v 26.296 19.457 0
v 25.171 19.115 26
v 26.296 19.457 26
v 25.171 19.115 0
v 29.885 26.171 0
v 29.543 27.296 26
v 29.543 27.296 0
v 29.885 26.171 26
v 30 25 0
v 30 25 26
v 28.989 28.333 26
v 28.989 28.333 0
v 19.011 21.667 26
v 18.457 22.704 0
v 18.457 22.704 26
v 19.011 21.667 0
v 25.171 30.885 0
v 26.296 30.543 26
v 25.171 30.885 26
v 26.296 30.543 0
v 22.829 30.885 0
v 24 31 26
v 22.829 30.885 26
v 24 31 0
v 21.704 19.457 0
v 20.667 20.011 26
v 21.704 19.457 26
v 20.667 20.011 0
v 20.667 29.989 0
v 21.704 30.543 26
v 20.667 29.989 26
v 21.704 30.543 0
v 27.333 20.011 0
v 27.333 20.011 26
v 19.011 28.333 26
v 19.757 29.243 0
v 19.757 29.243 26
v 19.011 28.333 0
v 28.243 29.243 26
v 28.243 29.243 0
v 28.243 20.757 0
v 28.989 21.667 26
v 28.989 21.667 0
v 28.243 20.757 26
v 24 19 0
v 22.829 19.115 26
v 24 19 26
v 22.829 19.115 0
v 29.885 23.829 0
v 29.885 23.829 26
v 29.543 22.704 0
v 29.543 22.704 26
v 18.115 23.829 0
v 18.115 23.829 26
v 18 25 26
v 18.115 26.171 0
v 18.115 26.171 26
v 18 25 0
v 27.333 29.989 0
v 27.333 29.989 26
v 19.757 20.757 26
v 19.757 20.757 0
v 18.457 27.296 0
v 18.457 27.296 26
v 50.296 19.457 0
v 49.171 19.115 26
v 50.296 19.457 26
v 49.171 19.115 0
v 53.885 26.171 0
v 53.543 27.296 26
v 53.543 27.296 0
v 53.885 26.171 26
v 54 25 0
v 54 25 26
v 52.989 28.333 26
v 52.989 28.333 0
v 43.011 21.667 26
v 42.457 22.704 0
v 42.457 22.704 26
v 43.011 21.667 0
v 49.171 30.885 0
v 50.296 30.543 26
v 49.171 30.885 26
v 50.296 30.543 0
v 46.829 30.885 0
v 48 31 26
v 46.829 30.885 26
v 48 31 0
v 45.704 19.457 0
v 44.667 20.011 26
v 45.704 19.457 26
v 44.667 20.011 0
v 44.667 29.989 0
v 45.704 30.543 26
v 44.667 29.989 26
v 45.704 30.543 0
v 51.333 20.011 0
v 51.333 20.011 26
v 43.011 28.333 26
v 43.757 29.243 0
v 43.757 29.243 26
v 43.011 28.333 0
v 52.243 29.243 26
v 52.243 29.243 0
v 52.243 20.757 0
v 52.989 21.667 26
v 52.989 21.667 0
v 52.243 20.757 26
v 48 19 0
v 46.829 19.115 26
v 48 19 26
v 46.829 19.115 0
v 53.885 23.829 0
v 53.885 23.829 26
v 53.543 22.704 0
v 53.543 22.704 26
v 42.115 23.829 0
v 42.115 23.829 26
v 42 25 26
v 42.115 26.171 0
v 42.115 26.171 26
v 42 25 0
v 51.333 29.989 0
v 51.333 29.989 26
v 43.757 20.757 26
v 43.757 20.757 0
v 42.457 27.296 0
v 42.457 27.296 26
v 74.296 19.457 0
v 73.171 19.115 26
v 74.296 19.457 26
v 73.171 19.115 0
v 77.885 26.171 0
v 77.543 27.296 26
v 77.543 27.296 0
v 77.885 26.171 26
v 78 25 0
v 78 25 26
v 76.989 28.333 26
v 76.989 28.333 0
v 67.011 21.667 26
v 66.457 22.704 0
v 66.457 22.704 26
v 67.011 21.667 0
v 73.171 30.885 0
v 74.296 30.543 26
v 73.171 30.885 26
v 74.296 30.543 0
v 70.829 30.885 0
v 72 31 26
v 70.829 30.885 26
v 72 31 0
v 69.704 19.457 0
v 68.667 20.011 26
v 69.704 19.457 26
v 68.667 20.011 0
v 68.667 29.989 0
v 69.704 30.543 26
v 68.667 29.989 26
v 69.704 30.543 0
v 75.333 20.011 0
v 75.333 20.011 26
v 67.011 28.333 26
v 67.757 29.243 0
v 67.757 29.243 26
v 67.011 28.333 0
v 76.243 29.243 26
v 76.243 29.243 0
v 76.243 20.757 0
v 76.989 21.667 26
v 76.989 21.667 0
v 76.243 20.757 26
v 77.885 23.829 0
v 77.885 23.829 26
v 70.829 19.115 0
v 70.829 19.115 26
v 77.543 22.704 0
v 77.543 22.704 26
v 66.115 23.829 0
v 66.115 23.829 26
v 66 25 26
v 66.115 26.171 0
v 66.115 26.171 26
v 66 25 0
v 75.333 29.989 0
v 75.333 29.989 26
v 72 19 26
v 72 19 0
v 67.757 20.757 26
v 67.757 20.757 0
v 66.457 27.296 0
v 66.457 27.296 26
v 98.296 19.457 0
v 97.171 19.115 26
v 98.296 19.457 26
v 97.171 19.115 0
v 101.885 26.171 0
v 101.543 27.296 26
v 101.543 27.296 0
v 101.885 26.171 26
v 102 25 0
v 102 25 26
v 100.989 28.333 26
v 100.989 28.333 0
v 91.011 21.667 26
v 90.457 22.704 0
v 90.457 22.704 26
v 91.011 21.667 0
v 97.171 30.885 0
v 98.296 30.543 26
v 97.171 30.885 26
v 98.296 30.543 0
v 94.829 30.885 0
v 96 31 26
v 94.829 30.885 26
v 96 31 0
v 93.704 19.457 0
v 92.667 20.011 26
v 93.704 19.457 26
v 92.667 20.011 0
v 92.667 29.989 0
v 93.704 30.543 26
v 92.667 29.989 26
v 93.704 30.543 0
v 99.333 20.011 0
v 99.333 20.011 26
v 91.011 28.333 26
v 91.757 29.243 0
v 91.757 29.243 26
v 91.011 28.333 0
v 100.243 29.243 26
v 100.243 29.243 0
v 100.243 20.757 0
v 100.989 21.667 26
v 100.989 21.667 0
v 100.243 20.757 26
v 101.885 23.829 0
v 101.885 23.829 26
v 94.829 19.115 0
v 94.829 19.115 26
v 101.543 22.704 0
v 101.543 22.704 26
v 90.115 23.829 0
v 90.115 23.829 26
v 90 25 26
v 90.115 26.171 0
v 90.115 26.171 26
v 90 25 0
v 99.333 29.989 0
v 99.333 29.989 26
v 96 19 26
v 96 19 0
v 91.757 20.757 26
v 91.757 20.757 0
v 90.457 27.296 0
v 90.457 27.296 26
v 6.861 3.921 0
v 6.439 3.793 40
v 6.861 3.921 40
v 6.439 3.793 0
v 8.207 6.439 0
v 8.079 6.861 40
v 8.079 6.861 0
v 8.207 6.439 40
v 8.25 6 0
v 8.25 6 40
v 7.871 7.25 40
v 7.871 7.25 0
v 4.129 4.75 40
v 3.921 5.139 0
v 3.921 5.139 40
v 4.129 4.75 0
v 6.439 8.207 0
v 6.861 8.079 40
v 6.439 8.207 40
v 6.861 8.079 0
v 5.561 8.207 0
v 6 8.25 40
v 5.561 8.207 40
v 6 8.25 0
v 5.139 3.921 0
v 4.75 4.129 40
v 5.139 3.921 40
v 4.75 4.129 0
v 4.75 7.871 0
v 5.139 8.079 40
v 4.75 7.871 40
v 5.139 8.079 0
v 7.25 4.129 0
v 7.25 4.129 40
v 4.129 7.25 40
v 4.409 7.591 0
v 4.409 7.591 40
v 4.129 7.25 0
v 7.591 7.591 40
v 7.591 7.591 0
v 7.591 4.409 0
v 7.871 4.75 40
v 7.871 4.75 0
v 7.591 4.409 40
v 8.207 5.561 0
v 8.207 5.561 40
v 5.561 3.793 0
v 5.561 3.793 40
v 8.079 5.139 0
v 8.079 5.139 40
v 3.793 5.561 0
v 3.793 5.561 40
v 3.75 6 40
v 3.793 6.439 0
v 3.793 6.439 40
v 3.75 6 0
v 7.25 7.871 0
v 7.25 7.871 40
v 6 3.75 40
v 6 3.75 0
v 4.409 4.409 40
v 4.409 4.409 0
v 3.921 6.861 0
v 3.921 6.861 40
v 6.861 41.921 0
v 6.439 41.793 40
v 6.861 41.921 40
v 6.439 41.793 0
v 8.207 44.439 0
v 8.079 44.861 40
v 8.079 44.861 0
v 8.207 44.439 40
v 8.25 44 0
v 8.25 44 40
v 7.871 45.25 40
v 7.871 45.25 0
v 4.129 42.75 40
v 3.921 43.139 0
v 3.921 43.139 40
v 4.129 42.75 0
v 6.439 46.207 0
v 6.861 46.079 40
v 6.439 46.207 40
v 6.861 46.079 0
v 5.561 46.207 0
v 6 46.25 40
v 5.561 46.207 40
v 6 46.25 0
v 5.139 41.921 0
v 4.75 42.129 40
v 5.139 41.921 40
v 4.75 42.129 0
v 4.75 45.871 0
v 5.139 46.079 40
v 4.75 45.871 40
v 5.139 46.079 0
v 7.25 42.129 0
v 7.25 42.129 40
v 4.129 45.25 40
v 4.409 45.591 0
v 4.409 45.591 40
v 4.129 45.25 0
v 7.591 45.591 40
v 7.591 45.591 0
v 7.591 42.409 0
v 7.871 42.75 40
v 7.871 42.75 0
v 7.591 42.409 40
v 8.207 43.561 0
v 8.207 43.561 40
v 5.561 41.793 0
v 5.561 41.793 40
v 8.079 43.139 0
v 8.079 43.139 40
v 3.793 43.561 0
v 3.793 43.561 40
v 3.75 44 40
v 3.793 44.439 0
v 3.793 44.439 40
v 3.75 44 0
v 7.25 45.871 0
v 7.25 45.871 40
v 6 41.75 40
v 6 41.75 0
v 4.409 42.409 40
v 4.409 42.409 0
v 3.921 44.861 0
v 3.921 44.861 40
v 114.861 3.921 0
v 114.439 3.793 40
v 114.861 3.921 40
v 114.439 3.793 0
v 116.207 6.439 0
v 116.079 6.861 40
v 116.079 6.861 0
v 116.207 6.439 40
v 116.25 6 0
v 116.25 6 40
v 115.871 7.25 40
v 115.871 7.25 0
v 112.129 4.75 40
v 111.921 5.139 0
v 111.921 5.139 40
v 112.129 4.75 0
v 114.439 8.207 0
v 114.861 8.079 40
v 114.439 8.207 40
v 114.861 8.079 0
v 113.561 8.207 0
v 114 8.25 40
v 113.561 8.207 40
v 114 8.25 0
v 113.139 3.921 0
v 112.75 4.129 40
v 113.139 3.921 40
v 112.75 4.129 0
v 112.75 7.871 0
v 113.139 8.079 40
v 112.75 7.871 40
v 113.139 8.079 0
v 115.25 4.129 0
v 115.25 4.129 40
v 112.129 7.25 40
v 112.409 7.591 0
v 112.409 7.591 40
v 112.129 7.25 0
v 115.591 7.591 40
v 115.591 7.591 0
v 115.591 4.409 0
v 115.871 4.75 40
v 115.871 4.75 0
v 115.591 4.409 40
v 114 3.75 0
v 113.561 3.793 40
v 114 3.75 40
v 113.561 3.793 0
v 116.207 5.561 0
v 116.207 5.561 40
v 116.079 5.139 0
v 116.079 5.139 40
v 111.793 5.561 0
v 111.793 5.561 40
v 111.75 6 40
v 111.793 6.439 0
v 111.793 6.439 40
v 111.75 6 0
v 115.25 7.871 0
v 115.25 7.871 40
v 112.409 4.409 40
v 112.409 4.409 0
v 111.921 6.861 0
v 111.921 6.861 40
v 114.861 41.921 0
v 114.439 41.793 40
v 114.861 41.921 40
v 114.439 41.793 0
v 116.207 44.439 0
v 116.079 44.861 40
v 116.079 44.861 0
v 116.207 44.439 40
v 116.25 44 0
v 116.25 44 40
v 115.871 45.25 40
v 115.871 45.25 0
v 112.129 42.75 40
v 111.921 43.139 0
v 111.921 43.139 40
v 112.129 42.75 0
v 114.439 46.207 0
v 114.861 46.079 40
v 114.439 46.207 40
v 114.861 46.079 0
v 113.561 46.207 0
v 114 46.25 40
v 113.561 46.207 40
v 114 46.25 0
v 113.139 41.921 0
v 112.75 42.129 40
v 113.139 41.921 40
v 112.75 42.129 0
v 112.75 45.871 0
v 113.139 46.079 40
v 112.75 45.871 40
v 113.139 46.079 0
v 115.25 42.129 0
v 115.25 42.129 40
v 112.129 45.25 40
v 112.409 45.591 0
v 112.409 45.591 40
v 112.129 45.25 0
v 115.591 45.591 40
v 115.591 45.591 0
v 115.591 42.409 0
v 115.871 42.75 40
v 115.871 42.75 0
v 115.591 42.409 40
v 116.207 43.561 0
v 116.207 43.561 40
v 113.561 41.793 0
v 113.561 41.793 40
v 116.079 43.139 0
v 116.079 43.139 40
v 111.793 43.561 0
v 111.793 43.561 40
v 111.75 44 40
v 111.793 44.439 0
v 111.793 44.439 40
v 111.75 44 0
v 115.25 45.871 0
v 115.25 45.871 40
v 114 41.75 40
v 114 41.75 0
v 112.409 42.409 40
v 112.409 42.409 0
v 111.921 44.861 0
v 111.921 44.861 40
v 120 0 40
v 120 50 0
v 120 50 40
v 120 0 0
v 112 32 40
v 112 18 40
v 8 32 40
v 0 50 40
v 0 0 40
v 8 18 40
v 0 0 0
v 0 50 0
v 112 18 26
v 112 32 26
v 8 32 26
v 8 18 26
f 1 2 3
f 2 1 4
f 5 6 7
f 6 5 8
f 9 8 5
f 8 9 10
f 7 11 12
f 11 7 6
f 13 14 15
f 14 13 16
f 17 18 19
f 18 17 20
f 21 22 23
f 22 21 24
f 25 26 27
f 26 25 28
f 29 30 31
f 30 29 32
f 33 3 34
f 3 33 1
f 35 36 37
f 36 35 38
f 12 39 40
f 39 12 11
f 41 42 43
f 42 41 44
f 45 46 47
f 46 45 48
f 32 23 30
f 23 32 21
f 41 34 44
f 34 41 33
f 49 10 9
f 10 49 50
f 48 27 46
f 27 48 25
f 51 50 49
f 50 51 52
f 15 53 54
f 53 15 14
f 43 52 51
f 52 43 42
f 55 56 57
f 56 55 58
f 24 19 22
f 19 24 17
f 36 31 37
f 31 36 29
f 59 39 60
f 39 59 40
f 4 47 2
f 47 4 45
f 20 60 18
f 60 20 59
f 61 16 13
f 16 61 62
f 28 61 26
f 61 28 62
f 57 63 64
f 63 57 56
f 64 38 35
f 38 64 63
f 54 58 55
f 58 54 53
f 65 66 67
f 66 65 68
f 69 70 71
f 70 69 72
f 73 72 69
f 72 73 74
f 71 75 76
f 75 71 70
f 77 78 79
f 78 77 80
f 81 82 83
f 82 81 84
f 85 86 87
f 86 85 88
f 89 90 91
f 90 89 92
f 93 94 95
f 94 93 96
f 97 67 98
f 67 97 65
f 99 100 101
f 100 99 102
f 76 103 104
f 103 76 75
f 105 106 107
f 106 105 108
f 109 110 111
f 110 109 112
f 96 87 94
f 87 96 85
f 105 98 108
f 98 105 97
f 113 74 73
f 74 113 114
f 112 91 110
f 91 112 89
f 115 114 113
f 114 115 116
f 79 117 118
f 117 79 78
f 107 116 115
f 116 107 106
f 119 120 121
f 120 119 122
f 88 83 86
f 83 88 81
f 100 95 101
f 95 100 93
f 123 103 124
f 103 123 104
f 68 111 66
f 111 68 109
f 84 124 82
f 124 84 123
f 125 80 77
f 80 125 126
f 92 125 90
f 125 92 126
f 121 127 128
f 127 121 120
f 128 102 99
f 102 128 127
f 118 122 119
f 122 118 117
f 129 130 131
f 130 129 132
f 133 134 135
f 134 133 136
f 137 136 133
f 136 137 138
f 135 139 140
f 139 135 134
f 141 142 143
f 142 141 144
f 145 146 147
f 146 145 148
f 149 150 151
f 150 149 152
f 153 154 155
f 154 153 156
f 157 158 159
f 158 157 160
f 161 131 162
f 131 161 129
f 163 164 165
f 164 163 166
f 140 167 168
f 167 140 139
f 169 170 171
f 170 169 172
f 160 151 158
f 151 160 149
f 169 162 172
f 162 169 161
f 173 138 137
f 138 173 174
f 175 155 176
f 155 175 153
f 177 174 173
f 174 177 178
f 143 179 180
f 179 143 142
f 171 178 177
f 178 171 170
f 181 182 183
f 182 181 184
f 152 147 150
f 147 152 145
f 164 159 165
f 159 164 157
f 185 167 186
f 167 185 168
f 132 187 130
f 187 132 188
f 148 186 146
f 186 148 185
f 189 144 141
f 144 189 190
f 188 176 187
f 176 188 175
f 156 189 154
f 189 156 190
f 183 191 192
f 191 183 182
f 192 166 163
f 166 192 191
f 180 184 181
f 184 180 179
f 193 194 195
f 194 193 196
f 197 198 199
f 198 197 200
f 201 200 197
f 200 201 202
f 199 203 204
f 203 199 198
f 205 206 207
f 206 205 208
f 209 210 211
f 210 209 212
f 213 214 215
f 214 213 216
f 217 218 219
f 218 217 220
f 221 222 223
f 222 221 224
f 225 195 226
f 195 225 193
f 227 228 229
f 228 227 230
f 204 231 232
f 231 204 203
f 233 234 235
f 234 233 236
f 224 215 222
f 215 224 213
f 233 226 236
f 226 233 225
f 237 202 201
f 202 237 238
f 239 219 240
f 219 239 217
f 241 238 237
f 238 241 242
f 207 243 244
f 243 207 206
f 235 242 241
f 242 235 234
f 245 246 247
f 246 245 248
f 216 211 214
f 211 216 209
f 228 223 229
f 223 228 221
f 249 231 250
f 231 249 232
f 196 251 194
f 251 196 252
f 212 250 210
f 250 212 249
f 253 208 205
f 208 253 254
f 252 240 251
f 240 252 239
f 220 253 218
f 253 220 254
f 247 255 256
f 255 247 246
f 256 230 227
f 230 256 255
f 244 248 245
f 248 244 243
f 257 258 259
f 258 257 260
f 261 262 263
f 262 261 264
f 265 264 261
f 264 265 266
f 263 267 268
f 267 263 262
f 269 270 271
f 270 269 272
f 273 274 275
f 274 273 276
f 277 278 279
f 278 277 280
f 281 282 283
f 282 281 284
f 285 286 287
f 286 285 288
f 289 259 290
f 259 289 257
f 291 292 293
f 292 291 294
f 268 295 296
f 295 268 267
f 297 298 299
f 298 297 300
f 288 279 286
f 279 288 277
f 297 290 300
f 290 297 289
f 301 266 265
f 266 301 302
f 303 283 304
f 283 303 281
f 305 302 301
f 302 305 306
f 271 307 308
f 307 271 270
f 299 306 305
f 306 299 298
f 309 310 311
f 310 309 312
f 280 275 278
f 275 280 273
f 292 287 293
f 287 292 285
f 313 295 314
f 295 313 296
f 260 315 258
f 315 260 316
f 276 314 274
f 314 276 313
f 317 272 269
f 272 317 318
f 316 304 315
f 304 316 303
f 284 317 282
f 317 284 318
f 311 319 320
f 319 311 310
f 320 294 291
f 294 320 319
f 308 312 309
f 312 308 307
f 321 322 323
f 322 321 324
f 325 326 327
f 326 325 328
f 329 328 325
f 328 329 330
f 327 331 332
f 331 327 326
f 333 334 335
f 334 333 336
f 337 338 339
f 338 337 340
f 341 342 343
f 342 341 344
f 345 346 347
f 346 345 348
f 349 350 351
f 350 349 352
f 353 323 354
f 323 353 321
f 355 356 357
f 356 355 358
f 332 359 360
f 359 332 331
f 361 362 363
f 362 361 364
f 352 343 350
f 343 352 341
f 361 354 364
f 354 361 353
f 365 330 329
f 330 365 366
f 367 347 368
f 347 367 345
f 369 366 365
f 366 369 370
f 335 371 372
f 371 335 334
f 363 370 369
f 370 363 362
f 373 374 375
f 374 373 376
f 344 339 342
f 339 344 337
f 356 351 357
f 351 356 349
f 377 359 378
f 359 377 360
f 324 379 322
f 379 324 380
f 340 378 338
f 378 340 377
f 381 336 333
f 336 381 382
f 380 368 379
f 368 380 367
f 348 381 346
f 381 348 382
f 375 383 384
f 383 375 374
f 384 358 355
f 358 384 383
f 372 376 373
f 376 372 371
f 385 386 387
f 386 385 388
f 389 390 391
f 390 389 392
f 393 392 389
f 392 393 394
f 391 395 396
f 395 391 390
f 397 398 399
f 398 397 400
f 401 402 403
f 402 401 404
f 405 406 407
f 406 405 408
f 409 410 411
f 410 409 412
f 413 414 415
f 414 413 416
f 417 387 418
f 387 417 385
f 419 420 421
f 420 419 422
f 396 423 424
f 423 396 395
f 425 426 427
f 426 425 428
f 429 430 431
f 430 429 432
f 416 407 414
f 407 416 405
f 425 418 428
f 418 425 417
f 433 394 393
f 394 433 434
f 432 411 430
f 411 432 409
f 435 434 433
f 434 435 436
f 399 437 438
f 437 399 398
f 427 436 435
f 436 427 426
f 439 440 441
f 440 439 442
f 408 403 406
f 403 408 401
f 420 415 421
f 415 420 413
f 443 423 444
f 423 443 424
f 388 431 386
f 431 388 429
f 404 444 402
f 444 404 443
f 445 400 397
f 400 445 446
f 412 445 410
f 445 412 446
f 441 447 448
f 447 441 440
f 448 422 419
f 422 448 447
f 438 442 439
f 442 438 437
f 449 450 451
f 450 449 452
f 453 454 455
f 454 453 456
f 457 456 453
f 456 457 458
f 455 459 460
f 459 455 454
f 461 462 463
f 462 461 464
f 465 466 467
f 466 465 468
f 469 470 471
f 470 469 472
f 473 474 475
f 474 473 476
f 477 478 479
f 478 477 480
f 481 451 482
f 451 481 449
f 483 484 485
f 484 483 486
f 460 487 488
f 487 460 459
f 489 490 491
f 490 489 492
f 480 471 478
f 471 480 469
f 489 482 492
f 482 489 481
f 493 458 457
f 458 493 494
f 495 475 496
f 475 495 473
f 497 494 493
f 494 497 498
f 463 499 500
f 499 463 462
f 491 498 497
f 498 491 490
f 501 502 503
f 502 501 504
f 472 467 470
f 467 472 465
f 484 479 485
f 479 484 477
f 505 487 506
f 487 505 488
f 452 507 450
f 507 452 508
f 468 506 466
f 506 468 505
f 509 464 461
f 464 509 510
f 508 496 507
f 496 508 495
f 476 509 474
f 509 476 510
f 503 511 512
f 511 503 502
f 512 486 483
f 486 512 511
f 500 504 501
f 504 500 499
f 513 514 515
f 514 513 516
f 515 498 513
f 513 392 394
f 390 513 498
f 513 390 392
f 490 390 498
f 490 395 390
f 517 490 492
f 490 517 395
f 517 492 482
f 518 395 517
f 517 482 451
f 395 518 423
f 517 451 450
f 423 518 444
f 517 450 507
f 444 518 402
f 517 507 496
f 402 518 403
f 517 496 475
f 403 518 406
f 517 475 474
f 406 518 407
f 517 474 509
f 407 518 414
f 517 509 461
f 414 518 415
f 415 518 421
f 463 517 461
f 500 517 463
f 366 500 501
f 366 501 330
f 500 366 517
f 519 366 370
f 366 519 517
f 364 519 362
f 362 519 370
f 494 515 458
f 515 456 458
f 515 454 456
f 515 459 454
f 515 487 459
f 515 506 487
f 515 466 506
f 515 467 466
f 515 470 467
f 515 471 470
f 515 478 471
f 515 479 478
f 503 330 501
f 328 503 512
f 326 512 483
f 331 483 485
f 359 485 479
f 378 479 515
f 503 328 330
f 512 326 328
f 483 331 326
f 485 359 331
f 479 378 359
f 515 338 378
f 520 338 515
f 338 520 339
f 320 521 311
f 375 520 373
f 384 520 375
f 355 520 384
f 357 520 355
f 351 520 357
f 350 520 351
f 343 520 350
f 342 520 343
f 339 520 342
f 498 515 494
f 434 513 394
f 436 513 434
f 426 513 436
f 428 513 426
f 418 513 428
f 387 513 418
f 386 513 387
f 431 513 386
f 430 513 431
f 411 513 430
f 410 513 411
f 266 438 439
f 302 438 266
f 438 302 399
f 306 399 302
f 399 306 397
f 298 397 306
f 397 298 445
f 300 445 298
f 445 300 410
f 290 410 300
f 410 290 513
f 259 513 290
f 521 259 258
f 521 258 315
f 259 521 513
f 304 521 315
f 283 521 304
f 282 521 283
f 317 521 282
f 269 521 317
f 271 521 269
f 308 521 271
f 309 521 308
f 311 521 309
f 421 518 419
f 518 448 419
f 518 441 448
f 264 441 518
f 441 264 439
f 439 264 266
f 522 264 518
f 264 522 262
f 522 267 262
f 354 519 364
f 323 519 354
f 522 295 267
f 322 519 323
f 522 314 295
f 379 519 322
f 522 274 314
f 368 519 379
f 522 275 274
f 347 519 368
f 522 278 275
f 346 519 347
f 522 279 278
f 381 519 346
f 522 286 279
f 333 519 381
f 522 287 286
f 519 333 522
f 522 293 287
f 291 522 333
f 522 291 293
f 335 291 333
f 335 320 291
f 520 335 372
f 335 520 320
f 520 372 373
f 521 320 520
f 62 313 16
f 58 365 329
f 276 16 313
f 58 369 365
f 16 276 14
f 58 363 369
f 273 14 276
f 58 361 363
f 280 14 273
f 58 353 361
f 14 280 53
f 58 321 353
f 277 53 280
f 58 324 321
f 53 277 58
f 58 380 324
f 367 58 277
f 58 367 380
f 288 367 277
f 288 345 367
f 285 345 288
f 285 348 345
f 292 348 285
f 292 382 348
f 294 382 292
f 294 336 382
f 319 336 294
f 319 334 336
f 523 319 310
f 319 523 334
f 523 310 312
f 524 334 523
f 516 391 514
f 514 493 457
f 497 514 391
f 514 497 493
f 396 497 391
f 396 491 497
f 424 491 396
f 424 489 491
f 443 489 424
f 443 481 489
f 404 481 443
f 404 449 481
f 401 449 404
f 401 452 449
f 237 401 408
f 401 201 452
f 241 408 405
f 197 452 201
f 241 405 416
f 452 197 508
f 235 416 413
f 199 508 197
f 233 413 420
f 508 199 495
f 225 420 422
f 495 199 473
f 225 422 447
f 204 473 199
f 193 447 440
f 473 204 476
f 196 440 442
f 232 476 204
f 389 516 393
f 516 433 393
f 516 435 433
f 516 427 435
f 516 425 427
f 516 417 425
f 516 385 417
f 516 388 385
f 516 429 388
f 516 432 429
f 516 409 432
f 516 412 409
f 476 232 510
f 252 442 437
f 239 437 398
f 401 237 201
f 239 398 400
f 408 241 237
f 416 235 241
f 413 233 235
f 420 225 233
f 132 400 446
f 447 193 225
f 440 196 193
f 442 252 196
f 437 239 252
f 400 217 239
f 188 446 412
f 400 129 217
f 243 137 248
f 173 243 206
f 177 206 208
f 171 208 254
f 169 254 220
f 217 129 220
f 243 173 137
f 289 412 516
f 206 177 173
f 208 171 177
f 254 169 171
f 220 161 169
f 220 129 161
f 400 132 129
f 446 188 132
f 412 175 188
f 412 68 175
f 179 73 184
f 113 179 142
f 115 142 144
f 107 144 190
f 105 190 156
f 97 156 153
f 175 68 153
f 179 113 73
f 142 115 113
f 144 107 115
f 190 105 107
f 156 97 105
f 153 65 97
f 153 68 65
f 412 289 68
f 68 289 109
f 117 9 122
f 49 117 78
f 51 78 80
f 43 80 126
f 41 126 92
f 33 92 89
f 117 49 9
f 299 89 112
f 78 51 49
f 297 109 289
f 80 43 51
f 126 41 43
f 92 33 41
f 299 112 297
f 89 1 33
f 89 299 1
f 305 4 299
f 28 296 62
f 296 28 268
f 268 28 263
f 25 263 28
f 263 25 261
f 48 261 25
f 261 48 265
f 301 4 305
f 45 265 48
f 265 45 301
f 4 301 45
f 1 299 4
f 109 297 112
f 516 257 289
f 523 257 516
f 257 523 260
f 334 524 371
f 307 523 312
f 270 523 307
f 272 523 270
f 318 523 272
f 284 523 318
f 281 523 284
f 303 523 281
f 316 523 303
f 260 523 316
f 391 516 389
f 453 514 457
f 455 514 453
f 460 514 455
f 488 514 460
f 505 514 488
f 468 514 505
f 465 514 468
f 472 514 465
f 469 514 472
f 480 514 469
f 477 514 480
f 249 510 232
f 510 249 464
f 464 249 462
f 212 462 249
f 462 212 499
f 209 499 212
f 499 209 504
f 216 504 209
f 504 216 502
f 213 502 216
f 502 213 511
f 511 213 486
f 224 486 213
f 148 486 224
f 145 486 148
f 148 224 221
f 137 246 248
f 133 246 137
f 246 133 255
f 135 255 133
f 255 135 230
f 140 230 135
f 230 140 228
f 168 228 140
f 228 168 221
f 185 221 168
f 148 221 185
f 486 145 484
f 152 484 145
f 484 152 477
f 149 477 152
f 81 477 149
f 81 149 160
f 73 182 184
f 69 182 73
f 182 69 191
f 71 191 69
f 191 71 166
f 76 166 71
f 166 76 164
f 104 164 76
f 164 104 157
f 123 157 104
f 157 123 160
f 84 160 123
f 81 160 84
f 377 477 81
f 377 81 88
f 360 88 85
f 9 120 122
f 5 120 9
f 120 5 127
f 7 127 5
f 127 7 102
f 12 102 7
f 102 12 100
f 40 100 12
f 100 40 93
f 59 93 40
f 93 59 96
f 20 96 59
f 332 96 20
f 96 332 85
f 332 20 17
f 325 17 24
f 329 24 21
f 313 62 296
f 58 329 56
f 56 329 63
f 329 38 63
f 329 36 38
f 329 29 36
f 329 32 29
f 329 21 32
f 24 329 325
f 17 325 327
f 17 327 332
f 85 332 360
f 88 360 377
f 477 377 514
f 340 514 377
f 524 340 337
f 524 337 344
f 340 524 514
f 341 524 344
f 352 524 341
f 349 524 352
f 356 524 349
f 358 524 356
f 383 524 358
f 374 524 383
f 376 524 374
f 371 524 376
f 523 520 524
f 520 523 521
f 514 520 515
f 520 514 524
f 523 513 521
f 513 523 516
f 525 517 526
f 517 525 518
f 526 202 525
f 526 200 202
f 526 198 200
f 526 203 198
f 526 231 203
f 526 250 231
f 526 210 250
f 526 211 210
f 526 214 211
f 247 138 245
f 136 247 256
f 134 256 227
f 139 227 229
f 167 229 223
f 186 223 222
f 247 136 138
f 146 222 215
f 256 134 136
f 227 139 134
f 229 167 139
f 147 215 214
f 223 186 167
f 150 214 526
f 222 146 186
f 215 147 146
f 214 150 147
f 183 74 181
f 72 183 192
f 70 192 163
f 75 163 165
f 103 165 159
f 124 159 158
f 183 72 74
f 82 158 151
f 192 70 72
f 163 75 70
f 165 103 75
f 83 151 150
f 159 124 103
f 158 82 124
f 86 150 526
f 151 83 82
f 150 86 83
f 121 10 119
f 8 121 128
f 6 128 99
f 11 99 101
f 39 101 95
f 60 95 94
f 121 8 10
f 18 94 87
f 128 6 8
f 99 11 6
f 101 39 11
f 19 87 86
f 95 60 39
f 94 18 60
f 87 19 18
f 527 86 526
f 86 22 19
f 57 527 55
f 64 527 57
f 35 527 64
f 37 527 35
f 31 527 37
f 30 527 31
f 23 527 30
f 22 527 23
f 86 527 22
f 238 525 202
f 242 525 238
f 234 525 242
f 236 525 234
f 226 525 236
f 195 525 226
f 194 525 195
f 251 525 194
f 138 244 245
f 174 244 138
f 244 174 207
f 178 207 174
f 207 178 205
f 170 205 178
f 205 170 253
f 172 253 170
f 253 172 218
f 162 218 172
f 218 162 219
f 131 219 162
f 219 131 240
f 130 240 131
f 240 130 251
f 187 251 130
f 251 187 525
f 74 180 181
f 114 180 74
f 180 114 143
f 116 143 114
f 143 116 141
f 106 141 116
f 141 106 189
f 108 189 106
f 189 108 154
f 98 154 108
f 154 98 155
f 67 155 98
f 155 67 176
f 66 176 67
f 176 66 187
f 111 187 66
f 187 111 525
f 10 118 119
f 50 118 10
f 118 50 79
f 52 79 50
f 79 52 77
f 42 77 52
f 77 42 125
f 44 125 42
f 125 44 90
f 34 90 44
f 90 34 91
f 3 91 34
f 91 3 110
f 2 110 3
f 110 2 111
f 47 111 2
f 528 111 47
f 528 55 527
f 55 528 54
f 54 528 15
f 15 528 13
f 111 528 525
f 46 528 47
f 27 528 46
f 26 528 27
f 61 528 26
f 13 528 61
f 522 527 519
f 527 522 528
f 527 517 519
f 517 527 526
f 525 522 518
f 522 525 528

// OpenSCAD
$fn = 32;

// ----------------------------------------------------------------------
// Manifold block: gallery_top manifold
// ----------------------------------------------------------------------

// --- parameters (mm) ---
block_l = 120;            // block length, X
block_w = 50;             // block width, Y
block_h = 40;             // block height, Z
port_d = 12;              // port bore diameter
port_pitch = 24;          // port pitch along X
gallery_d = 14;           // top gallery width, Y
gallery_depth = 14;       // gallery pocket depth
wall_p = 8;               // gallery end wall thickness, X
mnt_d = 4.5;              // mounting hole diameter
mnt_in = 6;               // mounting hole inset from the edges

n_ports = 4;  // ports in the row
port_x0 = (block_l - (n_ports - 1) * port_pitch) / 2;  // first port X

difference() {
  cube([block_l, block_w, block_h]);
  for (i = [0 : n_ports - 1])
    translate([port_x0 + i * port_pitch, block_w / 2, -1])
      cylinder(h = block_h + 2, d = port_d);
  translate([wall_p, block_w / 2 - gallery_d / 2, block_h - gallery_depth])
    cube([block_l - 2 * wall_p, gallery_d, gallery_depth + 1]);
  for (cx = [mnt_in, block_l - mnt_in])
    for (cy = [mnt_in, block_w - mnt_in])
      translate([cx, cy, -1]) cylinder(h = block_h + 2, d = mnt_d);
}
